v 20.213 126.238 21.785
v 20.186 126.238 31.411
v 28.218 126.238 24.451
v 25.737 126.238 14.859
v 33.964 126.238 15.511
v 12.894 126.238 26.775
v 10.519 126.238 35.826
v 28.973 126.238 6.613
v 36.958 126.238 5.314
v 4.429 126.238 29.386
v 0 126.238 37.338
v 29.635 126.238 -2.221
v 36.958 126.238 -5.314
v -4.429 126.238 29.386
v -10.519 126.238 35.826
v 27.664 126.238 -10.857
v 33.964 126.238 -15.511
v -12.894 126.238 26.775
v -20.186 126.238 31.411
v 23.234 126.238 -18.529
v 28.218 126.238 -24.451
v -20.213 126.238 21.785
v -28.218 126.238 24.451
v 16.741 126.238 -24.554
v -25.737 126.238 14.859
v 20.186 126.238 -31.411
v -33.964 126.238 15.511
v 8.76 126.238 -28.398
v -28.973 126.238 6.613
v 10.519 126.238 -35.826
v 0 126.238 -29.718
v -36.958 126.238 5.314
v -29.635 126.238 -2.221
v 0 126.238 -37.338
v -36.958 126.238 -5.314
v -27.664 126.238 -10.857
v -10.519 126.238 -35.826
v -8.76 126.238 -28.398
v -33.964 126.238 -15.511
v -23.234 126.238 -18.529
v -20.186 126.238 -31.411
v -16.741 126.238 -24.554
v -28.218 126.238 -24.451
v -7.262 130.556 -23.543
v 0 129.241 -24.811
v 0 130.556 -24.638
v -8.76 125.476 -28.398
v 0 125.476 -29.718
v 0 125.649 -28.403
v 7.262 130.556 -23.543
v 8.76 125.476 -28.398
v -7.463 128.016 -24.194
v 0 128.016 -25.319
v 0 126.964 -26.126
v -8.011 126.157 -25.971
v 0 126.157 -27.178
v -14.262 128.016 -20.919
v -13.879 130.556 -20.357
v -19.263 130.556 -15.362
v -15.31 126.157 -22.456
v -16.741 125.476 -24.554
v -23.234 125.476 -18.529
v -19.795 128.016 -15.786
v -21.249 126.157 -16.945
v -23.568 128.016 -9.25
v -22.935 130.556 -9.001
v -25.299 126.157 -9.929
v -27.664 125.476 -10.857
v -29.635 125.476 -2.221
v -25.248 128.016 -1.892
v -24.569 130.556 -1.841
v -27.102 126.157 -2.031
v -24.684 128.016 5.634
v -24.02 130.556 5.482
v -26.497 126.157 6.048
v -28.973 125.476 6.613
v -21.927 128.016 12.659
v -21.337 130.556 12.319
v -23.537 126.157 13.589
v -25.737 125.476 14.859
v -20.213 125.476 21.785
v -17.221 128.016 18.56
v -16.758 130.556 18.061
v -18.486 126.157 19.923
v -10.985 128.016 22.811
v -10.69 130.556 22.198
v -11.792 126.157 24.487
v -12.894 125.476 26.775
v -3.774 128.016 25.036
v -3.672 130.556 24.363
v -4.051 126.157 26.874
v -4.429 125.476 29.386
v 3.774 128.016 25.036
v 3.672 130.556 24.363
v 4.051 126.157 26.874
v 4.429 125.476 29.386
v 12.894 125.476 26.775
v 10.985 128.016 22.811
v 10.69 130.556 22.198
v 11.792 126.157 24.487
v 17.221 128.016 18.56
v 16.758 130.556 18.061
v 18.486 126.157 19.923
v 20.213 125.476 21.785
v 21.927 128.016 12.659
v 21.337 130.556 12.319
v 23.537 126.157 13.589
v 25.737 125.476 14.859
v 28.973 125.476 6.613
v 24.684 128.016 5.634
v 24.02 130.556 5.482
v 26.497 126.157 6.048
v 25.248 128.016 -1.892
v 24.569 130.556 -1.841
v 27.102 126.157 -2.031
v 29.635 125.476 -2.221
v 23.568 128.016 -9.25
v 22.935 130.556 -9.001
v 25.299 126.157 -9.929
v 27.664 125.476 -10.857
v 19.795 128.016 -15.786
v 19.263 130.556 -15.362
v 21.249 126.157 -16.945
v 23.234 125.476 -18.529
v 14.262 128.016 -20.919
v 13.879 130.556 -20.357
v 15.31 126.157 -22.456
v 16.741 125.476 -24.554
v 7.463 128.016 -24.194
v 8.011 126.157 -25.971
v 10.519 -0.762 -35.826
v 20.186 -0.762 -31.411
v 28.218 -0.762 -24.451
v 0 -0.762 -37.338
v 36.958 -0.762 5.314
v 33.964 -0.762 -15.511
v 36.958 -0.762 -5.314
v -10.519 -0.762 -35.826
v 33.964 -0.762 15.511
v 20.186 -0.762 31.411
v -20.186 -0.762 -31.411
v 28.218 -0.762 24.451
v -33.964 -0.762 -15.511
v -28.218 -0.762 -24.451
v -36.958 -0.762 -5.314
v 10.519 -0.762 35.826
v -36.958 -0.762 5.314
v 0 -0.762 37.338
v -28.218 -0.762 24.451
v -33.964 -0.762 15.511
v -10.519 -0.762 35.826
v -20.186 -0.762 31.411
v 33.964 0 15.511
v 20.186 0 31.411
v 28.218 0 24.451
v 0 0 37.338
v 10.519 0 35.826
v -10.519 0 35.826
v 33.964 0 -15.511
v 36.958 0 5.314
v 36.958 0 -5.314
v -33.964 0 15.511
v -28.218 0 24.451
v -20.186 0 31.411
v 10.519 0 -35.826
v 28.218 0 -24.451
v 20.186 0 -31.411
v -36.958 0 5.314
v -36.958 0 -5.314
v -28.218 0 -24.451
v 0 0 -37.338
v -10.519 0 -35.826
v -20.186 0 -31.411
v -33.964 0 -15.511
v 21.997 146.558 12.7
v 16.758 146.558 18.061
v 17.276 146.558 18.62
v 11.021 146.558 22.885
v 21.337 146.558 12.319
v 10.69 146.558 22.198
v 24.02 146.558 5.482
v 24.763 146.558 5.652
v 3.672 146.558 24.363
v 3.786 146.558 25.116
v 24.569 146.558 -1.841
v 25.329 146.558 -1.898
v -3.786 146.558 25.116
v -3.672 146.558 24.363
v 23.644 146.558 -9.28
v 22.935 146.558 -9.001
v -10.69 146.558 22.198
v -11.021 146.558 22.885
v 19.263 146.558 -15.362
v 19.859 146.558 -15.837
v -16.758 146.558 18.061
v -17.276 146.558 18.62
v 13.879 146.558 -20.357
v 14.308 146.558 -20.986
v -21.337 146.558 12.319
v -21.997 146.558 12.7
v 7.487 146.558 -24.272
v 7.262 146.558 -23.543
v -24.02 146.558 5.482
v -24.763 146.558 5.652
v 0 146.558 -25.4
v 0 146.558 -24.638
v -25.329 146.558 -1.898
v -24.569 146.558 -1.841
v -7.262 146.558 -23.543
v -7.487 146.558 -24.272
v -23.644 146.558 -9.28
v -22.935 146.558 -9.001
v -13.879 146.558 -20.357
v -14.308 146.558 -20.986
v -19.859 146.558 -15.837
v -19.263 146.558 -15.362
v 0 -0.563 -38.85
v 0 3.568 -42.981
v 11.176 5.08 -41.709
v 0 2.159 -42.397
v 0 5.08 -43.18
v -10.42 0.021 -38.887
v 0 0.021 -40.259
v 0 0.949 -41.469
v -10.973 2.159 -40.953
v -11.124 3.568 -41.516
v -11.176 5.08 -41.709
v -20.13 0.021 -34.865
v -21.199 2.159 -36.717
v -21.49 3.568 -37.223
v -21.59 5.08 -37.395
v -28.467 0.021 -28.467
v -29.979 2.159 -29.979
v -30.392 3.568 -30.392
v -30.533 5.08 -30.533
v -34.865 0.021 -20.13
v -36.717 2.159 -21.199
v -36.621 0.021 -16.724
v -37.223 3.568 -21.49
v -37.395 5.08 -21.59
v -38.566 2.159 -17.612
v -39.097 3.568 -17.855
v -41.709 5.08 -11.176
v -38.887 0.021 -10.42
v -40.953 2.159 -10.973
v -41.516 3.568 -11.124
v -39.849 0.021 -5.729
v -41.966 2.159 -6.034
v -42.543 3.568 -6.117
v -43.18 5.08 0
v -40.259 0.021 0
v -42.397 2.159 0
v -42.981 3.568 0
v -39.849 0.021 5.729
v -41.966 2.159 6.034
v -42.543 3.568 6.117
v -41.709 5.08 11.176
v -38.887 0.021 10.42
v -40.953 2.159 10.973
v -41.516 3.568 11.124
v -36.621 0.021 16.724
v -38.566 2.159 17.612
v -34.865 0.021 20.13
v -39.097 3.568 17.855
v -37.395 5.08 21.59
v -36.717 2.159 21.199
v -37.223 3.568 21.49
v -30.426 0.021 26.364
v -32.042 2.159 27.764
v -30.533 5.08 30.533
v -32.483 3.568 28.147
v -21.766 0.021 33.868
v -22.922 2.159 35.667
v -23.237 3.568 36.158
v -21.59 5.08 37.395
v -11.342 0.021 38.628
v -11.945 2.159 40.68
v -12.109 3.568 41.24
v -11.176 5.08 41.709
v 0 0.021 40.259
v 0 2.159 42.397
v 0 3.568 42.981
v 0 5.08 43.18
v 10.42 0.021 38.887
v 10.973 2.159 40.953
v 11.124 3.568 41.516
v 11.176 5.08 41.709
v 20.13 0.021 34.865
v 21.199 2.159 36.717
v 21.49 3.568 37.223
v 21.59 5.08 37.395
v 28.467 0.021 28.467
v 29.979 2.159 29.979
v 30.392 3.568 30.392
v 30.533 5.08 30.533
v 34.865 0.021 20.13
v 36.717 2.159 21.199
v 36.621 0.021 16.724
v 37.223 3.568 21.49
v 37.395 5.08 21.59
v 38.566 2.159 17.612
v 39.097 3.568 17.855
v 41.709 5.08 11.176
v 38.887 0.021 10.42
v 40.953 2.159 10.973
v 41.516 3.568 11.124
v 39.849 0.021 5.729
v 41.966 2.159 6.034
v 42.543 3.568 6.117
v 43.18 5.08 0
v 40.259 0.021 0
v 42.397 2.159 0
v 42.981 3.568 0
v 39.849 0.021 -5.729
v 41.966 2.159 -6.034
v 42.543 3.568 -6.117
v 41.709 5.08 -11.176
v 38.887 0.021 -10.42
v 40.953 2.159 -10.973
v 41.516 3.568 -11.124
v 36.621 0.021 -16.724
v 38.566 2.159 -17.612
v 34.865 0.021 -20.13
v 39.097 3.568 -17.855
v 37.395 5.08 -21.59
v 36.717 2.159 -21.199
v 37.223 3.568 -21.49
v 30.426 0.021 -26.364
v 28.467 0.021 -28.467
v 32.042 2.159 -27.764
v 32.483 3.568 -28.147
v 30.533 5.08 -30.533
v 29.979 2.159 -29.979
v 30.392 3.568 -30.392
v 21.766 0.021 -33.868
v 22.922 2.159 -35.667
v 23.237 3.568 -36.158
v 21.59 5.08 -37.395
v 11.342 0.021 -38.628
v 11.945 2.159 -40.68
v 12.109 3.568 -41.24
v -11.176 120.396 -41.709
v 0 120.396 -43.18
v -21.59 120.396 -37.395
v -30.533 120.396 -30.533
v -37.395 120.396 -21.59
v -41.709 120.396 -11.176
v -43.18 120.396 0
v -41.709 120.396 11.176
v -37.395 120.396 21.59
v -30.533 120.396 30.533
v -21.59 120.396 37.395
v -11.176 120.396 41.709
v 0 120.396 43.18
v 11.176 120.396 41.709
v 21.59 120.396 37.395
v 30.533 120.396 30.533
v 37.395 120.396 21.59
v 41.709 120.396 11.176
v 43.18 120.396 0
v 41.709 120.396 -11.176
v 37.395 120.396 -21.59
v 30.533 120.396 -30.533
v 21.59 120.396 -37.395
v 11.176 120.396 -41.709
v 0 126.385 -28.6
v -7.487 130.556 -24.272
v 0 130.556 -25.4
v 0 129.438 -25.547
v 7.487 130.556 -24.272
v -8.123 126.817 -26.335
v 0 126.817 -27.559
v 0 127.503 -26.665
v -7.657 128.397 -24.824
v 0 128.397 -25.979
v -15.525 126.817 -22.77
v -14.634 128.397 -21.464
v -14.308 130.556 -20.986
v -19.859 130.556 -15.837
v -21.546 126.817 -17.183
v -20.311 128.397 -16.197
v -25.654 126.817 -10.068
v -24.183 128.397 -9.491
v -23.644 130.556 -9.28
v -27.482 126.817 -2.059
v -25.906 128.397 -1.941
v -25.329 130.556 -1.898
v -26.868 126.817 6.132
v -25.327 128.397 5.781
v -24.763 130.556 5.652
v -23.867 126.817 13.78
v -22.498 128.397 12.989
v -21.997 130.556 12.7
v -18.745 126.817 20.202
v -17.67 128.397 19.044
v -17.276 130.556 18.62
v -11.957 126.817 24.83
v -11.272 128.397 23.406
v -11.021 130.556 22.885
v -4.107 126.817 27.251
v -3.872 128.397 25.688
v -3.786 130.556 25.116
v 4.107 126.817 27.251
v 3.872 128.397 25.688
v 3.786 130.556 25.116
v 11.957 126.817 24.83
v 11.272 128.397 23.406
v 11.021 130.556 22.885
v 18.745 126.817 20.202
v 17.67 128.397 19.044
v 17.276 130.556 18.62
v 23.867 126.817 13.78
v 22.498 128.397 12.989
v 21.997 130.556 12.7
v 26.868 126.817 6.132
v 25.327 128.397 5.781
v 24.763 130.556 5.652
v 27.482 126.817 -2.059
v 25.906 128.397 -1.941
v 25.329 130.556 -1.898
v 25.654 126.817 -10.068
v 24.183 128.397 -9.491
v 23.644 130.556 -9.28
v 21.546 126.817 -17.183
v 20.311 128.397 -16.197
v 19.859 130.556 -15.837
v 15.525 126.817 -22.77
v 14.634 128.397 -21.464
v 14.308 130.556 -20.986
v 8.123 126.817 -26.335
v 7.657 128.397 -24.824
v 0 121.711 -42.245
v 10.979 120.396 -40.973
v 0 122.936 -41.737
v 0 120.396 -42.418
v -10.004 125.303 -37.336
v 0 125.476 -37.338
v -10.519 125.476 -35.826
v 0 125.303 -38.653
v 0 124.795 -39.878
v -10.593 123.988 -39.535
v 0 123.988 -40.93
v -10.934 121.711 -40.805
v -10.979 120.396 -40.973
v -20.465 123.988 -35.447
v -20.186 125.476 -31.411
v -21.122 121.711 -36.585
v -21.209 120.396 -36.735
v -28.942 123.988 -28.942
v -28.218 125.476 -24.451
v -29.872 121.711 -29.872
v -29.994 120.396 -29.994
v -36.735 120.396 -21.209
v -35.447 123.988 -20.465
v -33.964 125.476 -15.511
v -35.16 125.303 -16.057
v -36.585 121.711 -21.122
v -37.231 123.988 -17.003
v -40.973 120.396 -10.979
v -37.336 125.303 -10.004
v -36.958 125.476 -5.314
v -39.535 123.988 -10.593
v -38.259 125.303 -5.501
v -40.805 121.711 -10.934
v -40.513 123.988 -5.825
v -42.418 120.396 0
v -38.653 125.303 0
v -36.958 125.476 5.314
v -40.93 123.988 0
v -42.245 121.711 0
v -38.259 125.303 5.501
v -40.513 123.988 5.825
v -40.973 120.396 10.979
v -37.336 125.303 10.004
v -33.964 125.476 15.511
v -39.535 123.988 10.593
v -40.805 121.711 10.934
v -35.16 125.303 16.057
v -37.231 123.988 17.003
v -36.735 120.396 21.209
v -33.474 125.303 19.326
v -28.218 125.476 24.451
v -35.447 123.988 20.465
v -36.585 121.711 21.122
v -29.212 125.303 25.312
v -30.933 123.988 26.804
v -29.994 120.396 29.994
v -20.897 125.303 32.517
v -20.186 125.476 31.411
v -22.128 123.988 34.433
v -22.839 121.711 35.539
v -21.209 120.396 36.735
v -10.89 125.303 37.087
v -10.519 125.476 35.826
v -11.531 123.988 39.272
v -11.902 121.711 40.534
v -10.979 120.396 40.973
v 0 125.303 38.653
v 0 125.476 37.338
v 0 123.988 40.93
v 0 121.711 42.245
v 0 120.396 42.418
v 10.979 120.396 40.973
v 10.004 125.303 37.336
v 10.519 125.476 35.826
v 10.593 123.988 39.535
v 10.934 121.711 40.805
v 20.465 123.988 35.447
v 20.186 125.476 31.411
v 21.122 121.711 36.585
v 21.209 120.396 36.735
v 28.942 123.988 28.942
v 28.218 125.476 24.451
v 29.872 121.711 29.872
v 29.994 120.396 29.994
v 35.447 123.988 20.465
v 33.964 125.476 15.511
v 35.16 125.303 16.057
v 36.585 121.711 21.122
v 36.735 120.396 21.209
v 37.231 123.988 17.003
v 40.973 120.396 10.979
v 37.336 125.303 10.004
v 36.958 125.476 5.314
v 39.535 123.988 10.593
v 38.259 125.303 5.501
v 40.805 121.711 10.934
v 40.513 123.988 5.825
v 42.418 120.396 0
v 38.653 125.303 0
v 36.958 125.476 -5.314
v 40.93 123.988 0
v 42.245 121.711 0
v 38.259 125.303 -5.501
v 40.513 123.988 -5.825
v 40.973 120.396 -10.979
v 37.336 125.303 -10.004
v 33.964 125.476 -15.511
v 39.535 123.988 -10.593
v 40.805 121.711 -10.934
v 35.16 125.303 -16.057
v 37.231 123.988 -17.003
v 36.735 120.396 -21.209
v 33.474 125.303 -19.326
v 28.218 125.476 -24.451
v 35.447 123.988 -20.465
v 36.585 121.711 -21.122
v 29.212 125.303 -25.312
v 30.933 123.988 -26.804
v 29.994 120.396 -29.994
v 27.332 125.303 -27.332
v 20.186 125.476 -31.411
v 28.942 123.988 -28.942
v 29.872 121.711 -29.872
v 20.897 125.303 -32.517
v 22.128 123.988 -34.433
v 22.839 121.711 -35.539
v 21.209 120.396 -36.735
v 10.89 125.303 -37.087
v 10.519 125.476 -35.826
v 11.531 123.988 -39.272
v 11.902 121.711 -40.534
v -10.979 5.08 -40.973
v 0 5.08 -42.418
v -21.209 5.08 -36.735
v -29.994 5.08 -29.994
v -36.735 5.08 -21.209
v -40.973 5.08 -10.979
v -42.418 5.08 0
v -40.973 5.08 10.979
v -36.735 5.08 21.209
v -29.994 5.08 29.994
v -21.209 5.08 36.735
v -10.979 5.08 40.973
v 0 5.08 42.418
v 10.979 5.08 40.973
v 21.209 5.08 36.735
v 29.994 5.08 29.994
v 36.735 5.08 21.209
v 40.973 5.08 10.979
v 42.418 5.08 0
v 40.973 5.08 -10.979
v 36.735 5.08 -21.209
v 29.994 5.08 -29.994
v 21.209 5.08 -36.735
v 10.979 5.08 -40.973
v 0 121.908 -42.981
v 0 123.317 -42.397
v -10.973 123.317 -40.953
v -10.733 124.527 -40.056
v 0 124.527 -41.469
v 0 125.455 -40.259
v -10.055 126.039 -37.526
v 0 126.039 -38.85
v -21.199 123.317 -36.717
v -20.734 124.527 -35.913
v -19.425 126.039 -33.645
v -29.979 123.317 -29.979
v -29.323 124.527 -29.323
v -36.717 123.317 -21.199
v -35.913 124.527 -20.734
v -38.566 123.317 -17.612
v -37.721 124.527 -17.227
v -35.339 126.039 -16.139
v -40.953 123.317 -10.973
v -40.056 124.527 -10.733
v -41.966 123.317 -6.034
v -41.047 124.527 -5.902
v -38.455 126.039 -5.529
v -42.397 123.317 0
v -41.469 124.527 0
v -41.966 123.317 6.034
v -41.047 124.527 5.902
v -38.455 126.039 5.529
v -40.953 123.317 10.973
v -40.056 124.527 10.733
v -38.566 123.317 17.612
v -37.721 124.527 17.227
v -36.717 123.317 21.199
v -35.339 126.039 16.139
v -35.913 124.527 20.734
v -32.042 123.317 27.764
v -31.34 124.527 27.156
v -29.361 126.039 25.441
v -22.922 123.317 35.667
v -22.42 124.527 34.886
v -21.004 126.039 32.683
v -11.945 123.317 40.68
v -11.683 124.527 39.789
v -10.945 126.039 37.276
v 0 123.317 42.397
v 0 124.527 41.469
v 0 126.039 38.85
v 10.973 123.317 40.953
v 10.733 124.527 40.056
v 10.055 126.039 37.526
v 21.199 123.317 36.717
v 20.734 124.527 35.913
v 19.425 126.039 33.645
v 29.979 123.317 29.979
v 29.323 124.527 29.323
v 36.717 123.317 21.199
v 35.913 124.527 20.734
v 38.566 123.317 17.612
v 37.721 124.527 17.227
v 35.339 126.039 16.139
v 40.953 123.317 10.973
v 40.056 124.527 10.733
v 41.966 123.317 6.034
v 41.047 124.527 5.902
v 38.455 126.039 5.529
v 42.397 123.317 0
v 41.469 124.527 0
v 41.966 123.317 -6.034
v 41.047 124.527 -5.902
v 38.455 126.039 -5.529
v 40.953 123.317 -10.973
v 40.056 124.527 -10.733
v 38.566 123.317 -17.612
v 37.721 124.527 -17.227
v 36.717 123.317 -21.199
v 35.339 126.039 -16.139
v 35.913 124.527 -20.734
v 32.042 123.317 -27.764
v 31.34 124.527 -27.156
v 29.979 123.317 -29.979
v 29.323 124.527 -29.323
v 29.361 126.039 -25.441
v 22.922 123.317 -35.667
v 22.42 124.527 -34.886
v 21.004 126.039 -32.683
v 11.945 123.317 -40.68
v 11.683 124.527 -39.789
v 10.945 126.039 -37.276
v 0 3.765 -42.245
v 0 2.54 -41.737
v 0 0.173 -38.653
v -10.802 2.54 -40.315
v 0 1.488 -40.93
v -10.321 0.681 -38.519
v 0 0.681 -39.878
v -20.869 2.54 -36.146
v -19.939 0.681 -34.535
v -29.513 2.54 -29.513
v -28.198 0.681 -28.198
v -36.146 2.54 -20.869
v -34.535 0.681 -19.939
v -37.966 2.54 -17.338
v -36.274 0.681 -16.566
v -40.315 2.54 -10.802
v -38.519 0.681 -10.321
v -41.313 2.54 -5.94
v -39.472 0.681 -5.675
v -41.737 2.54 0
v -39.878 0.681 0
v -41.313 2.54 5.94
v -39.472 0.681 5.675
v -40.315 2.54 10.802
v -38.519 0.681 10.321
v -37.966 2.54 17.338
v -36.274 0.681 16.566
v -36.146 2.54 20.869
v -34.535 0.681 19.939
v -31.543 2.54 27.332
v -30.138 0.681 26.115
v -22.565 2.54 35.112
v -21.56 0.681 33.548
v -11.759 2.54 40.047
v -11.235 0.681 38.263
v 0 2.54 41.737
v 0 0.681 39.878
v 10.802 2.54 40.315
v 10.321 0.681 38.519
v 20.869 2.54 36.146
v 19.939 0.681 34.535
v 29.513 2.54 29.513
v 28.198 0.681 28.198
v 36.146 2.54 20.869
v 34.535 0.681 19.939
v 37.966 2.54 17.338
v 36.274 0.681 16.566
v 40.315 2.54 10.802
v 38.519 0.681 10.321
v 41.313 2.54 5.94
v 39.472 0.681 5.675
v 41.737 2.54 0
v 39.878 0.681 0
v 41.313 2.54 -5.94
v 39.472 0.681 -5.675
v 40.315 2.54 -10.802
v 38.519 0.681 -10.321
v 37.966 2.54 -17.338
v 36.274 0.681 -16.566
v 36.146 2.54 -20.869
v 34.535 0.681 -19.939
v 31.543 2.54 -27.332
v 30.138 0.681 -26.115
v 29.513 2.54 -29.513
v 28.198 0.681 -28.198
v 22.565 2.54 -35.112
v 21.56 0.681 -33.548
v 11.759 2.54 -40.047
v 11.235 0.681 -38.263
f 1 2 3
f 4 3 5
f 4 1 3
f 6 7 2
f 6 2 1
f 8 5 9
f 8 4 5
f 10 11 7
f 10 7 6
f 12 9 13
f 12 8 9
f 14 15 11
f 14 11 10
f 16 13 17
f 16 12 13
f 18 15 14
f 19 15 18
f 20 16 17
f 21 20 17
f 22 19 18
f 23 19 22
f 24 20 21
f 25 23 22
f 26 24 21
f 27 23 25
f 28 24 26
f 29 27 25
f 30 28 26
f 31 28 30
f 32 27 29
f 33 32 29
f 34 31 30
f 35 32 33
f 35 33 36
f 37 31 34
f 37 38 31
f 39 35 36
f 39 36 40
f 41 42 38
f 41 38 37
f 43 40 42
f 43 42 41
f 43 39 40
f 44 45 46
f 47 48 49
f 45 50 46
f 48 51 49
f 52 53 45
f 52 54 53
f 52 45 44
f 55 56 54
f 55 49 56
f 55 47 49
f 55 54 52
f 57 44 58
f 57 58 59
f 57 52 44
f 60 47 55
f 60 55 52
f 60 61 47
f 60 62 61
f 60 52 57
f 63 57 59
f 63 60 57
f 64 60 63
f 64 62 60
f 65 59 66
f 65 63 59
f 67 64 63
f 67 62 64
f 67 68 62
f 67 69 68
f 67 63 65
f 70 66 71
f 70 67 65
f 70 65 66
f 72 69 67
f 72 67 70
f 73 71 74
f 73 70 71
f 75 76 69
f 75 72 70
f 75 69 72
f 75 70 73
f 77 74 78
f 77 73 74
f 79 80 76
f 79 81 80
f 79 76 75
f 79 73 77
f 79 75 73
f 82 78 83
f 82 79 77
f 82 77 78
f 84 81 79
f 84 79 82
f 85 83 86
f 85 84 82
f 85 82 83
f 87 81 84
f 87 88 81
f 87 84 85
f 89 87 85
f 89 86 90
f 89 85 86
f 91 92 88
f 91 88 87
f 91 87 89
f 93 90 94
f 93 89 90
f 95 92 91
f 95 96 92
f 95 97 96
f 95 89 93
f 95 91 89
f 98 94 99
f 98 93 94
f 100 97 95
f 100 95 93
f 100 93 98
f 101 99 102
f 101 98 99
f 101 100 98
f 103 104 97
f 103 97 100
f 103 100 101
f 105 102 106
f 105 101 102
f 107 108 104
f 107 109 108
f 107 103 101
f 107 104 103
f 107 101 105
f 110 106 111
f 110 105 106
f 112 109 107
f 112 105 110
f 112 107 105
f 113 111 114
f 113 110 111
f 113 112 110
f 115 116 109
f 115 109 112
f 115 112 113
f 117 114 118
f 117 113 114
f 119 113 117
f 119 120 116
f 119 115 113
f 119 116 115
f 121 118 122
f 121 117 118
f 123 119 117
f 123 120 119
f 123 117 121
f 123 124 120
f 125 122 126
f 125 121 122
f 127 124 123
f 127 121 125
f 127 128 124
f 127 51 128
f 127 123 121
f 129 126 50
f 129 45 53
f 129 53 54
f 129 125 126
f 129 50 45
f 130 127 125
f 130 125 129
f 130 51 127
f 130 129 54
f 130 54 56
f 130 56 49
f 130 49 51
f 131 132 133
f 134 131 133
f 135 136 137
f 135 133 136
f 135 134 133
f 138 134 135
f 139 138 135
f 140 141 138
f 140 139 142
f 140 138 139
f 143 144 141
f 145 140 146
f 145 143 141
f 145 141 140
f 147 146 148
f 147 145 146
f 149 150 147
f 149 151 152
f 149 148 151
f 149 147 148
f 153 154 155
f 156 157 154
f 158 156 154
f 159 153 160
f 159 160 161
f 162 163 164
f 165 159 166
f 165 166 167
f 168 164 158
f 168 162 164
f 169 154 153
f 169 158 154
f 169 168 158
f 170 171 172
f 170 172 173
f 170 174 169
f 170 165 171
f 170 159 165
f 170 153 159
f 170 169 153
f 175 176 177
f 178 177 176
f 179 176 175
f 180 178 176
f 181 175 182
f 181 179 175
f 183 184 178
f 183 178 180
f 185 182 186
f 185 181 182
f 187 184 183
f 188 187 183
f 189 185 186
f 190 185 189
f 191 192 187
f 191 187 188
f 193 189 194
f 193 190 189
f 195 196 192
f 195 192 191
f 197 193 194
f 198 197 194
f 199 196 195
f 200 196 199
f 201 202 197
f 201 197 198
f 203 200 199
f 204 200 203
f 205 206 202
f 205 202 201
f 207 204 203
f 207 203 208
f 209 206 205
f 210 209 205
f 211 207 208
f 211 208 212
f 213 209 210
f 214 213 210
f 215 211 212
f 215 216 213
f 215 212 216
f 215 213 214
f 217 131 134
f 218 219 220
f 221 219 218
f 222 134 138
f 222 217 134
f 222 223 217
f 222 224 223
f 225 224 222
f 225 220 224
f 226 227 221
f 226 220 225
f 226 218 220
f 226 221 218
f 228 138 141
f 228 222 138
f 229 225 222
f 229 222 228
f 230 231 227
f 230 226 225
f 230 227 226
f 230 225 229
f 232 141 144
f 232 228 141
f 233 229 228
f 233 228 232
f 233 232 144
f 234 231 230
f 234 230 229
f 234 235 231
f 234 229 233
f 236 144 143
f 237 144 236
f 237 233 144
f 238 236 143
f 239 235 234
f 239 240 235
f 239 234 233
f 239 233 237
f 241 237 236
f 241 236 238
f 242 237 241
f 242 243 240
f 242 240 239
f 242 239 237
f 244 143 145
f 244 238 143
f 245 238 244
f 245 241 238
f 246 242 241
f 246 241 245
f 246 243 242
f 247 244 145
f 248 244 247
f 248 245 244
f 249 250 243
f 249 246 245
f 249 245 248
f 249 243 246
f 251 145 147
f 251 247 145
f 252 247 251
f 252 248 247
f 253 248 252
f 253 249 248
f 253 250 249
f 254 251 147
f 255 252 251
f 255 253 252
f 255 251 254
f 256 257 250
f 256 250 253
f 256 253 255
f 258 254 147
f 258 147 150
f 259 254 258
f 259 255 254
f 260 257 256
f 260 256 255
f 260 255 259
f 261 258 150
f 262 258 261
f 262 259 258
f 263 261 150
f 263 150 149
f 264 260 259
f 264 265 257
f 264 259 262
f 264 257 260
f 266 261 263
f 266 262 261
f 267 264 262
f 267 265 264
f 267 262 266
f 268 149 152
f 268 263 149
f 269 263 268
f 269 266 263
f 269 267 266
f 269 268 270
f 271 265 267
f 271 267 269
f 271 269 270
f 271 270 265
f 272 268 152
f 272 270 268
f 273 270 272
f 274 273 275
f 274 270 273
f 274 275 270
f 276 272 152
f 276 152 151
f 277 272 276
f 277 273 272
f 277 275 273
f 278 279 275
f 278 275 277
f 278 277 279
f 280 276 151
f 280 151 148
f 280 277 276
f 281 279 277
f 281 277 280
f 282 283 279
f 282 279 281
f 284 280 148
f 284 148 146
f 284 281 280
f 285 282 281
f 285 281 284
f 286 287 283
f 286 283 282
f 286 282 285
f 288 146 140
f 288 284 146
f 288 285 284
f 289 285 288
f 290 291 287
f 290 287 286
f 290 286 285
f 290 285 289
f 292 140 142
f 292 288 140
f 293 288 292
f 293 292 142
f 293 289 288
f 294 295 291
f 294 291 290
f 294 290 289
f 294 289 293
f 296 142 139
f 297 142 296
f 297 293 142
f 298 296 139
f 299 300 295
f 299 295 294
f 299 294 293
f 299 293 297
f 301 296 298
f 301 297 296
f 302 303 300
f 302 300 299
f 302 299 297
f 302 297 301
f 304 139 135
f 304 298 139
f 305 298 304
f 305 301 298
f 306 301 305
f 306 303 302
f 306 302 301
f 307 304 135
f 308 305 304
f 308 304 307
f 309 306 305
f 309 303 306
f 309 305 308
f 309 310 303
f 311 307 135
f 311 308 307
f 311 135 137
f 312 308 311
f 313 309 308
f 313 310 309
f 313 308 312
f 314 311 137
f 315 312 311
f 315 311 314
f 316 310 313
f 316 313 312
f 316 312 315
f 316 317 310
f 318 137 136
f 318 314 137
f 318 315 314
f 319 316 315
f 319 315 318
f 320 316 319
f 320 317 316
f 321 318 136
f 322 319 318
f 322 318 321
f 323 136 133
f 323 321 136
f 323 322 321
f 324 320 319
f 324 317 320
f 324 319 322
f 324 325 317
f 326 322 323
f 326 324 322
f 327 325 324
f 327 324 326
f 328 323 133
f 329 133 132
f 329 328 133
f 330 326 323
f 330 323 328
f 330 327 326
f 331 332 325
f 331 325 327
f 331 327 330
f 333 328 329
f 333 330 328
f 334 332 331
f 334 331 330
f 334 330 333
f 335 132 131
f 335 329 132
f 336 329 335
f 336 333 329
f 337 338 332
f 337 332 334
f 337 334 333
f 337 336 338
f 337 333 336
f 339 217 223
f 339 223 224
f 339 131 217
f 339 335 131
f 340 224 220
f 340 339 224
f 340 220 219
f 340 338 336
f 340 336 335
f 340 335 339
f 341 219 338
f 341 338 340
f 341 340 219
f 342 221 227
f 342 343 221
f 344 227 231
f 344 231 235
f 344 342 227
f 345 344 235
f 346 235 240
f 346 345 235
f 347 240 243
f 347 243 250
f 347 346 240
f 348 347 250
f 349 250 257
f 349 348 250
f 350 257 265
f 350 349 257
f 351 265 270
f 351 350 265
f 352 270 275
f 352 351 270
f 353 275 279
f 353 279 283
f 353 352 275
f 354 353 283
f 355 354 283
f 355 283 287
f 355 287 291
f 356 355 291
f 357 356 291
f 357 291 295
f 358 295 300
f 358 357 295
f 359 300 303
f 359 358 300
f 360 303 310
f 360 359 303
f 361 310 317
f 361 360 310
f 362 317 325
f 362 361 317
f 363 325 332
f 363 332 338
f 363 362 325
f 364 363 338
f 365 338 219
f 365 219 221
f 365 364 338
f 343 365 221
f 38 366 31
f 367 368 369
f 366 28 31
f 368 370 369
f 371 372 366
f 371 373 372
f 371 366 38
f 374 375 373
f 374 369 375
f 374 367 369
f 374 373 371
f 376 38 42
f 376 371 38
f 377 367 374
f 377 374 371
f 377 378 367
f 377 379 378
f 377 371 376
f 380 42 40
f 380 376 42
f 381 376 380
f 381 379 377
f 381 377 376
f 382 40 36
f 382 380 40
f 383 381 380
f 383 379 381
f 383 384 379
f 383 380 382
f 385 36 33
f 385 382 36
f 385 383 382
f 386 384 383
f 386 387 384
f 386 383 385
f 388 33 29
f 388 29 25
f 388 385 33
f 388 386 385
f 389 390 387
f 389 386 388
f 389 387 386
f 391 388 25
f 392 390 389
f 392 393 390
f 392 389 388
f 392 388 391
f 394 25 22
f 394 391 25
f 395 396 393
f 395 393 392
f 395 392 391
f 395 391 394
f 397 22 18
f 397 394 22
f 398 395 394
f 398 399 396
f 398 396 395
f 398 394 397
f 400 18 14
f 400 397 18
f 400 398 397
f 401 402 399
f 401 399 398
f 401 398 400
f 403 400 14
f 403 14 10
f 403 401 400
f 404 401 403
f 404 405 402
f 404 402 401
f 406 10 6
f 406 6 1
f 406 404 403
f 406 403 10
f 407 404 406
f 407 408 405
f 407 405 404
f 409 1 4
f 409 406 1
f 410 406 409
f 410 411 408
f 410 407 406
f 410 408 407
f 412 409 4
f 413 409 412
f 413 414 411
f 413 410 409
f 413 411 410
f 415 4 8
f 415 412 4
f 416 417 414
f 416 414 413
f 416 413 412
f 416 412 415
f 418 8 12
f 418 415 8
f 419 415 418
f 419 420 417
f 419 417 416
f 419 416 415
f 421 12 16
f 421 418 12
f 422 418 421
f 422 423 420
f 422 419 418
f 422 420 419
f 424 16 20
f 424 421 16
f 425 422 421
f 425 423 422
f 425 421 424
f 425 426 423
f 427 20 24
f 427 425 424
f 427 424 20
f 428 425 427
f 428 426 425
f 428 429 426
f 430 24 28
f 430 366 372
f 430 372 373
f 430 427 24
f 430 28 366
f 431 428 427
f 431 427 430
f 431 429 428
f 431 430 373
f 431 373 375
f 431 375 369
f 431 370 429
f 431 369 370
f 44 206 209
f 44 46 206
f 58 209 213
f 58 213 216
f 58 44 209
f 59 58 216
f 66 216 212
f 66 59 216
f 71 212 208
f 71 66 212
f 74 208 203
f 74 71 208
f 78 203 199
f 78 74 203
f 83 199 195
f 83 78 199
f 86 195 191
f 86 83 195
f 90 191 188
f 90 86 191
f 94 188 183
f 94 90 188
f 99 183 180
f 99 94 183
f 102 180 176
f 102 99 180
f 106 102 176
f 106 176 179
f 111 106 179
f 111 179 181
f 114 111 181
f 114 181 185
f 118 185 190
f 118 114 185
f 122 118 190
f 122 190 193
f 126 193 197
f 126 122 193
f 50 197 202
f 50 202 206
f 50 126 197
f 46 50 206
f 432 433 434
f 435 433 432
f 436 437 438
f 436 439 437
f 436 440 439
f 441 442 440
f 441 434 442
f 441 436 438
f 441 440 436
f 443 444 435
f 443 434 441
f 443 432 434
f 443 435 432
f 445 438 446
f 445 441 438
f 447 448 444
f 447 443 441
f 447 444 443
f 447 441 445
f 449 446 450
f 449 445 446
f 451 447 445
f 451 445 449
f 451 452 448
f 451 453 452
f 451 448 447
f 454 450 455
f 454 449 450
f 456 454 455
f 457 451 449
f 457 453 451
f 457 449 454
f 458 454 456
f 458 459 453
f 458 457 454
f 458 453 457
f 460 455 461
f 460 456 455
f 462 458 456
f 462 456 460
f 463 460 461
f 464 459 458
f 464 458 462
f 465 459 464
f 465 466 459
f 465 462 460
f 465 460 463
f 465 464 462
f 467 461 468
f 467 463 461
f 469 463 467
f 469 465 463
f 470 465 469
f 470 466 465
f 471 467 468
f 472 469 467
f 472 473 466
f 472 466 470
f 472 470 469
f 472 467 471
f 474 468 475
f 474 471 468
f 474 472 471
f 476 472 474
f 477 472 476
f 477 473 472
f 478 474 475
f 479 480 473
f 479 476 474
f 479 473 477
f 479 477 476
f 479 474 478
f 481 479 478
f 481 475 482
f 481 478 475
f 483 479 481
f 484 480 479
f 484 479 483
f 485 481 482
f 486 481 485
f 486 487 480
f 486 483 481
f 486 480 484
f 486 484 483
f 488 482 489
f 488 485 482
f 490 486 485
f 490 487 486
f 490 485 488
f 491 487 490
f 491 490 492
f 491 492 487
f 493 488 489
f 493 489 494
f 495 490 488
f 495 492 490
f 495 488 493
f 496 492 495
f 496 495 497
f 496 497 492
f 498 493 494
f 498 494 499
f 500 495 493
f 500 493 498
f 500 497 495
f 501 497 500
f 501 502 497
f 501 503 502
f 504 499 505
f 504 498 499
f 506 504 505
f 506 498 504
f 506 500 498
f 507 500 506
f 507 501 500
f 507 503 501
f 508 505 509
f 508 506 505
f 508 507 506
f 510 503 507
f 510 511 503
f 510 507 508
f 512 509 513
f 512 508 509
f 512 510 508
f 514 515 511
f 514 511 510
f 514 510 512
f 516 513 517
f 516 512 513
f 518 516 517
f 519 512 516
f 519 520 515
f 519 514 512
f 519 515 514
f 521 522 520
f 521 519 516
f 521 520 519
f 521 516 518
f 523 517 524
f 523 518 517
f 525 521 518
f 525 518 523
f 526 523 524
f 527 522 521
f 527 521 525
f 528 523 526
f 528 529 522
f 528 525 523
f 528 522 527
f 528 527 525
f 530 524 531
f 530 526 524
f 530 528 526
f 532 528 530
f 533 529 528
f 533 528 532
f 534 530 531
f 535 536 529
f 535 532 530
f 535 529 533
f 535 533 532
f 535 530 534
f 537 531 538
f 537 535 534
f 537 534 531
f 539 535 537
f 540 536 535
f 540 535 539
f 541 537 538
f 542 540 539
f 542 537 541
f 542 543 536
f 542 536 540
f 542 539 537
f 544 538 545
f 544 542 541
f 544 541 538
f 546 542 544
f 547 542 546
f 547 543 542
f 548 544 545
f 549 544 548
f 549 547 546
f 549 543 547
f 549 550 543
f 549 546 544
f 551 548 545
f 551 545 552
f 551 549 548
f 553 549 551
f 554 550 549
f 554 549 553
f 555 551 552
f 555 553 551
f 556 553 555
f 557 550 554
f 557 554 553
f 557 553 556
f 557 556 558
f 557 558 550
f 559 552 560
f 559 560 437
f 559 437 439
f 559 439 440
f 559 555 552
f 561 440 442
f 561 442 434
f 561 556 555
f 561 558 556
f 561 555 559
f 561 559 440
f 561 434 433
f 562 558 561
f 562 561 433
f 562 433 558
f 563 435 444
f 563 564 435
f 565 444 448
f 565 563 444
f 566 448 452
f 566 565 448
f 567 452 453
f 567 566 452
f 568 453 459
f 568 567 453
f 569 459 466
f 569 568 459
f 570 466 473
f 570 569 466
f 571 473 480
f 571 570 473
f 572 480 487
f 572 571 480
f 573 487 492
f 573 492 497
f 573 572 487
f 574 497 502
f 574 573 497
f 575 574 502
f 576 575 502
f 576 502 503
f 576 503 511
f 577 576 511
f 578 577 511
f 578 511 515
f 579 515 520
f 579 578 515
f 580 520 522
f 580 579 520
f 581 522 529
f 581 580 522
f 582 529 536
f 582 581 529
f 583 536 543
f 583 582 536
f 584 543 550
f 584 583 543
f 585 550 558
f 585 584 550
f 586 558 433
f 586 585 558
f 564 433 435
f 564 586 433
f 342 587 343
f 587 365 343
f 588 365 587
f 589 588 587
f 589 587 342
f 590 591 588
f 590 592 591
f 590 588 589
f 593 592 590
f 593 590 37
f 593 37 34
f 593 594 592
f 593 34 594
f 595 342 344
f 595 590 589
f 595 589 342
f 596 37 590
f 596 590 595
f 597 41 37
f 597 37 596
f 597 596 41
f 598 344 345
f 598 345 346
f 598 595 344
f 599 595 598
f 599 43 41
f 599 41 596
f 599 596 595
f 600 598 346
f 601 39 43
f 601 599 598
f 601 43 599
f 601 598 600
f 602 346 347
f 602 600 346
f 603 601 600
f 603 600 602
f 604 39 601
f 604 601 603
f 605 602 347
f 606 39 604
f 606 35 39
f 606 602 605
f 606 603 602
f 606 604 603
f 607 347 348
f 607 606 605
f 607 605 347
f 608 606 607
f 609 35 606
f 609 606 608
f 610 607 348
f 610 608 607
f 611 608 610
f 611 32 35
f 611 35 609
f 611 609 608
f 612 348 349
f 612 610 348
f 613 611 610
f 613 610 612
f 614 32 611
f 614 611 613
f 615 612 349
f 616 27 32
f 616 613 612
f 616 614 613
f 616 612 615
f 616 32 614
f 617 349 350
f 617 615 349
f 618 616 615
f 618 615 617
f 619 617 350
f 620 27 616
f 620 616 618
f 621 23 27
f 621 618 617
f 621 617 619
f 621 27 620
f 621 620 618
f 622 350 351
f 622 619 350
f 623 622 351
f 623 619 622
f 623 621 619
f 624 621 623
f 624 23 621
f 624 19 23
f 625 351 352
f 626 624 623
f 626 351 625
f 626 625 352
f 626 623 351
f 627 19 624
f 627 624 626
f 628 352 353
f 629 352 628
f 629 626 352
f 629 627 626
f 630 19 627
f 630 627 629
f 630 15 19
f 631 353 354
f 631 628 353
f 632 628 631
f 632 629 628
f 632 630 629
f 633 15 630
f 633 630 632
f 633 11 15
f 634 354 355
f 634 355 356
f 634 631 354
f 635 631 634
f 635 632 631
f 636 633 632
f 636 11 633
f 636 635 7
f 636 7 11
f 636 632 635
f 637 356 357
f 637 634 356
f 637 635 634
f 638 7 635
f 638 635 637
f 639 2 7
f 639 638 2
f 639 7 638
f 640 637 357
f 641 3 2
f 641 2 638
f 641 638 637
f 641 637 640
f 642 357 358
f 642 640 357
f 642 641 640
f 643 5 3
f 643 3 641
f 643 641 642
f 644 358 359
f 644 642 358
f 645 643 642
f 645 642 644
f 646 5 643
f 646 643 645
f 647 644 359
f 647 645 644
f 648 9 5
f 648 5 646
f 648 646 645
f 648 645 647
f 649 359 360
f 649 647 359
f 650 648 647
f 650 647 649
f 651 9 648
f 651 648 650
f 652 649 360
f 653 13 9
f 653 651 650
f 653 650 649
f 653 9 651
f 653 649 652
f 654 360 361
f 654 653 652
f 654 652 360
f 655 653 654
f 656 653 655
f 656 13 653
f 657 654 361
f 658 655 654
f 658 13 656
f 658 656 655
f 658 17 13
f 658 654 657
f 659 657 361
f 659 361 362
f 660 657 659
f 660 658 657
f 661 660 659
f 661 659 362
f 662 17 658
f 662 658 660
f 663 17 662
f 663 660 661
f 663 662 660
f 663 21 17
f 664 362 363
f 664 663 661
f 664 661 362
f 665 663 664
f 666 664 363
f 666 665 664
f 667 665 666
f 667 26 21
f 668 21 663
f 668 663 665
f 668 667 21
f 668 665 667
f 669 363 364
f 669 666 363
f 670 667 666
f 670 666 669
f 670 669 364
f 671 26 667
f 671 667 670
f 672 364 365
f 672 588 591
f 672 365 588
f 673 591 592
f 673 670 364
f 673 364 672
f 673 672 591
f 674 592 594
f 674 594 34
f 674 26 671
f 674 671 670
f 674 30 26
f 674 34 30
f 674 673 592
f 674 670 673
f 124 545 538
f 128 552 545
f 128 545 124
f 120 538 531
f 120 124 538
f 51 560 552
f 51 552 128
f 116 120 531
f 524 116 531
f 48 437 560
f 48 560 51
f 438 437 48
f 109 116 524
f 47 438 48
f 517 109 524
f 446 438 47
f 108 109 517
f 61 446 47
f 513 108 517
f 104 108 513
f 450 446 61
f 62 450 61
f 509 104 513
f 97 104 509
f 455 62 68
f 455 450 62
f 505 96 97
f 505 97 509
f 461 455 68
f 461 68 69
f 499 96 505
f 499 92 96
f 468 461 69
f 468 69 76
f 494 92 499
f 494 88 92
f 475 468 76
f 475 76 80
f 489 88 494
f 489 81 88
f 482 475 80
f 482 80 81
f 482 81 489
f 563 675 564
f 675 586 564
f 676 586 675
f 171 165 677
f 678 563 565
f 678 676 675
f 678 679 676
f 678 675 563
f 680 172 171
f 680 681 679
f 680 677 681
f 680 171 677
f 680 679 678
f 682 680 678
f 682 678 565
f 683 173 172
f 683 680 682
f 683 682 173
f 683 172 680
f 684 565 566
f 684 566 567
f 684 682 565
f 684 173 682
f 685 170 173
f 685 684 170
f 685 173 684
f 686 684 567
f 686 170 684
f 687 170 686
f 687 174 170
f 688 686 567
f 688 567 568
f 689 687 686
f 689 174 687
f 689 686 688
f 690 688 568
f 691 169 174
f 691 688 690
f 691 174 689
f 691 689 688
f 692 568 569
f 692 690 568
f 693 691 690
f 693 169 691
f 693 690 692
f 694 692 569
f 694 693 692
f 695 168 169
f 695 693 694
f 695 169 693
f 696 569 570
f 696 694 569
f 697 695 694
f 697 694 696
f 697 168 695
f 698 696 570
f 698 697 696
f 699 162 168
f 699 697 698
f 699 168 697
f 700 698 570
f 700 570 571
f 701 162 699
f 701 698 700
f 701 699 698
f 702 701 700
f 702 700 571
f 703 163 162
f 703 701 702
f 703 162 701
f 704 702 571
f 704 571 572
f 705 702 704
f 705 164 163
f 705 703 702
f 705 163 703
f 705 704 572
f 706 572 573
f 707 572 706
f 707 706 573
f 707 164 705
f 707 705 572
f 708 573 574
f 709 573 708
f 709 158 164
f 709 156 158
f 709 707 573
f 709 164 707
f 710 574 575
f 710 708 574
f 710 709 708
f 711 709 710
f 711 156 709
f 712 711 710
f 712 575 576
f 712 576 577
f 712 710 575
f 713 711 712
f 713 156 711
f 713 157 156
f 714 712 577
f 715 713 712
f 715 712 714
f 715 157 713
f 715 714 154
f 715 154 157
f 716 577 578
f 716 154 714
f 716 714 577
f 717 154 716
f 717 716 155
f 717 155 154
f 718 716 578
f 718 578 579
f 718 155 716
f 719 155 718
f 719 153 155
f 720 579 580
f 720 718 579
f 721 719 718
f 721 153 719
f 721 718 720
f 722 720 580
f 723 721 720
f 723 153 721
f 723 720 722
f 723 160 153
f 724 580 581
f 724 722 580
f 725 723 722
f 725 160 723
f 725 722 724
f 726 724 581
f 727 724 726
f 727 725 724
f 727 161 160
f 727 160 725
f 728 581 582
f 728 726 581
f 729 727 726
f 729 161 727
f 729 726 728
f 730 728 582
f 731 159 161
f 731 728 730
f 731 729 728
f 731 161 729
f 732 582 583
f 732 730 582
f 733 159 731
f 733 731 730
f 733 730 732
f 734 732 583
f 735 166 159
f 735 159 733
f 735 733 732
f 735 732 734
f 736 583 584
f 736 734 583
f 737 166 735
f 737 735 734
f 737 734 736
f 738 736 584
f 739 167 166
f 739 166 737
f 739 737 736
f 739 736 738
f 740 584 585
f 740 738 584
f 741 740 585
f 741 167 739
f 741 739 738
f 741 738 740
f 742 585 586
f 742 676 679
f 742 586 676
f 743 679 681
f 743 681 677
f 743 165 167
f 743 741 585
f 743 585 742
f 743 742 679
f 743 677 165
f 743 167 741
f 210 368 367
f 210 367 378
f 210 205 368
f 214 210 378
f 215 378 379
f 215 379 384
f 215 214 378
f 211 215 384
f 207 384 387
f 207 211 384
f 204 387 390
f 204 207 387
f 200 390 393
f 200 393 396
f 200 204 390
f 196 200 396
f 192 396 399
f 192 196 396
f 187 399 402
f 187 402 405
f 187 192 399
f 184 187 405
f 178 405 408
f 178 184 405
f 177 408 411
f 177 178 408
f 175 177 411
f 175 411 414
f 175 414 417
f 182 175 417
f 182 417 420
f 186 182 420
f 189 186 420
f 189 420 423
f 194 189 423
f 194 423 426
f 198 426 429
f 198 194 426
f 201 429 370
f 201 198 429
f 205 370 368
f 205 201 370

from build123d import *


with BuildPart() as part:
    # Sketch2 → Revolve1 (revolve)
    with BuildSketch(Plane.XY, mode=Mode.PRIVATE) as revolve1_sk:
        with BuildLine():
            Line((24.638, 146.558), (24.638, 130.556))
            ThreePointArc((24.638, 130.556), (26.125897552, 126.963897552), (29.718, 125.476))
            Line((29.718, 125.476), (37.338, 125.476))
            ThreePointArc((37.338, 125.476), (40.930102448, 123.988102448), (42.418, 120.396))
            Line((42.418, 120.396), (42.418, 5.08))
            ThreePointArc((42.418, 5.08), (40.930102448, 1.487897552), (37.338, 0))
            Line((37.338, 0), (0, 0))
            Line((0, 0), (0, -0.762))
            Line((0, -0.762), (37.338, -0.762))
            ThreePointArc((37.338, -0.762), (41.468917816, 0.949082184), (43.18, 5.08))
            Line((43.18, 5.08), (43.18, 120.396))
            ThreePointArc((43.18, 120.396), (41.468917816, 124.526917816), (37.338, 126.238))
            Line((37.338, 126.238), (29.718, 126.238))
            ThreePointArc((29.718, 126.238), (26.664712919, 127.502712919), (25.4, 130.556))
            Line((25.4, 130.556), (25.4, 146.558))
            Line((25.4, 146.558), (24.638, 146.558))
        make_face()
    revolve(revolve1_sk.sketch.rotate(Axis((0, -97.378122646, 0), (0, 1, 0)), 90), axis=Axis((0, -97.378122646, 0), (0, 1, 0)))


solid = part.part
